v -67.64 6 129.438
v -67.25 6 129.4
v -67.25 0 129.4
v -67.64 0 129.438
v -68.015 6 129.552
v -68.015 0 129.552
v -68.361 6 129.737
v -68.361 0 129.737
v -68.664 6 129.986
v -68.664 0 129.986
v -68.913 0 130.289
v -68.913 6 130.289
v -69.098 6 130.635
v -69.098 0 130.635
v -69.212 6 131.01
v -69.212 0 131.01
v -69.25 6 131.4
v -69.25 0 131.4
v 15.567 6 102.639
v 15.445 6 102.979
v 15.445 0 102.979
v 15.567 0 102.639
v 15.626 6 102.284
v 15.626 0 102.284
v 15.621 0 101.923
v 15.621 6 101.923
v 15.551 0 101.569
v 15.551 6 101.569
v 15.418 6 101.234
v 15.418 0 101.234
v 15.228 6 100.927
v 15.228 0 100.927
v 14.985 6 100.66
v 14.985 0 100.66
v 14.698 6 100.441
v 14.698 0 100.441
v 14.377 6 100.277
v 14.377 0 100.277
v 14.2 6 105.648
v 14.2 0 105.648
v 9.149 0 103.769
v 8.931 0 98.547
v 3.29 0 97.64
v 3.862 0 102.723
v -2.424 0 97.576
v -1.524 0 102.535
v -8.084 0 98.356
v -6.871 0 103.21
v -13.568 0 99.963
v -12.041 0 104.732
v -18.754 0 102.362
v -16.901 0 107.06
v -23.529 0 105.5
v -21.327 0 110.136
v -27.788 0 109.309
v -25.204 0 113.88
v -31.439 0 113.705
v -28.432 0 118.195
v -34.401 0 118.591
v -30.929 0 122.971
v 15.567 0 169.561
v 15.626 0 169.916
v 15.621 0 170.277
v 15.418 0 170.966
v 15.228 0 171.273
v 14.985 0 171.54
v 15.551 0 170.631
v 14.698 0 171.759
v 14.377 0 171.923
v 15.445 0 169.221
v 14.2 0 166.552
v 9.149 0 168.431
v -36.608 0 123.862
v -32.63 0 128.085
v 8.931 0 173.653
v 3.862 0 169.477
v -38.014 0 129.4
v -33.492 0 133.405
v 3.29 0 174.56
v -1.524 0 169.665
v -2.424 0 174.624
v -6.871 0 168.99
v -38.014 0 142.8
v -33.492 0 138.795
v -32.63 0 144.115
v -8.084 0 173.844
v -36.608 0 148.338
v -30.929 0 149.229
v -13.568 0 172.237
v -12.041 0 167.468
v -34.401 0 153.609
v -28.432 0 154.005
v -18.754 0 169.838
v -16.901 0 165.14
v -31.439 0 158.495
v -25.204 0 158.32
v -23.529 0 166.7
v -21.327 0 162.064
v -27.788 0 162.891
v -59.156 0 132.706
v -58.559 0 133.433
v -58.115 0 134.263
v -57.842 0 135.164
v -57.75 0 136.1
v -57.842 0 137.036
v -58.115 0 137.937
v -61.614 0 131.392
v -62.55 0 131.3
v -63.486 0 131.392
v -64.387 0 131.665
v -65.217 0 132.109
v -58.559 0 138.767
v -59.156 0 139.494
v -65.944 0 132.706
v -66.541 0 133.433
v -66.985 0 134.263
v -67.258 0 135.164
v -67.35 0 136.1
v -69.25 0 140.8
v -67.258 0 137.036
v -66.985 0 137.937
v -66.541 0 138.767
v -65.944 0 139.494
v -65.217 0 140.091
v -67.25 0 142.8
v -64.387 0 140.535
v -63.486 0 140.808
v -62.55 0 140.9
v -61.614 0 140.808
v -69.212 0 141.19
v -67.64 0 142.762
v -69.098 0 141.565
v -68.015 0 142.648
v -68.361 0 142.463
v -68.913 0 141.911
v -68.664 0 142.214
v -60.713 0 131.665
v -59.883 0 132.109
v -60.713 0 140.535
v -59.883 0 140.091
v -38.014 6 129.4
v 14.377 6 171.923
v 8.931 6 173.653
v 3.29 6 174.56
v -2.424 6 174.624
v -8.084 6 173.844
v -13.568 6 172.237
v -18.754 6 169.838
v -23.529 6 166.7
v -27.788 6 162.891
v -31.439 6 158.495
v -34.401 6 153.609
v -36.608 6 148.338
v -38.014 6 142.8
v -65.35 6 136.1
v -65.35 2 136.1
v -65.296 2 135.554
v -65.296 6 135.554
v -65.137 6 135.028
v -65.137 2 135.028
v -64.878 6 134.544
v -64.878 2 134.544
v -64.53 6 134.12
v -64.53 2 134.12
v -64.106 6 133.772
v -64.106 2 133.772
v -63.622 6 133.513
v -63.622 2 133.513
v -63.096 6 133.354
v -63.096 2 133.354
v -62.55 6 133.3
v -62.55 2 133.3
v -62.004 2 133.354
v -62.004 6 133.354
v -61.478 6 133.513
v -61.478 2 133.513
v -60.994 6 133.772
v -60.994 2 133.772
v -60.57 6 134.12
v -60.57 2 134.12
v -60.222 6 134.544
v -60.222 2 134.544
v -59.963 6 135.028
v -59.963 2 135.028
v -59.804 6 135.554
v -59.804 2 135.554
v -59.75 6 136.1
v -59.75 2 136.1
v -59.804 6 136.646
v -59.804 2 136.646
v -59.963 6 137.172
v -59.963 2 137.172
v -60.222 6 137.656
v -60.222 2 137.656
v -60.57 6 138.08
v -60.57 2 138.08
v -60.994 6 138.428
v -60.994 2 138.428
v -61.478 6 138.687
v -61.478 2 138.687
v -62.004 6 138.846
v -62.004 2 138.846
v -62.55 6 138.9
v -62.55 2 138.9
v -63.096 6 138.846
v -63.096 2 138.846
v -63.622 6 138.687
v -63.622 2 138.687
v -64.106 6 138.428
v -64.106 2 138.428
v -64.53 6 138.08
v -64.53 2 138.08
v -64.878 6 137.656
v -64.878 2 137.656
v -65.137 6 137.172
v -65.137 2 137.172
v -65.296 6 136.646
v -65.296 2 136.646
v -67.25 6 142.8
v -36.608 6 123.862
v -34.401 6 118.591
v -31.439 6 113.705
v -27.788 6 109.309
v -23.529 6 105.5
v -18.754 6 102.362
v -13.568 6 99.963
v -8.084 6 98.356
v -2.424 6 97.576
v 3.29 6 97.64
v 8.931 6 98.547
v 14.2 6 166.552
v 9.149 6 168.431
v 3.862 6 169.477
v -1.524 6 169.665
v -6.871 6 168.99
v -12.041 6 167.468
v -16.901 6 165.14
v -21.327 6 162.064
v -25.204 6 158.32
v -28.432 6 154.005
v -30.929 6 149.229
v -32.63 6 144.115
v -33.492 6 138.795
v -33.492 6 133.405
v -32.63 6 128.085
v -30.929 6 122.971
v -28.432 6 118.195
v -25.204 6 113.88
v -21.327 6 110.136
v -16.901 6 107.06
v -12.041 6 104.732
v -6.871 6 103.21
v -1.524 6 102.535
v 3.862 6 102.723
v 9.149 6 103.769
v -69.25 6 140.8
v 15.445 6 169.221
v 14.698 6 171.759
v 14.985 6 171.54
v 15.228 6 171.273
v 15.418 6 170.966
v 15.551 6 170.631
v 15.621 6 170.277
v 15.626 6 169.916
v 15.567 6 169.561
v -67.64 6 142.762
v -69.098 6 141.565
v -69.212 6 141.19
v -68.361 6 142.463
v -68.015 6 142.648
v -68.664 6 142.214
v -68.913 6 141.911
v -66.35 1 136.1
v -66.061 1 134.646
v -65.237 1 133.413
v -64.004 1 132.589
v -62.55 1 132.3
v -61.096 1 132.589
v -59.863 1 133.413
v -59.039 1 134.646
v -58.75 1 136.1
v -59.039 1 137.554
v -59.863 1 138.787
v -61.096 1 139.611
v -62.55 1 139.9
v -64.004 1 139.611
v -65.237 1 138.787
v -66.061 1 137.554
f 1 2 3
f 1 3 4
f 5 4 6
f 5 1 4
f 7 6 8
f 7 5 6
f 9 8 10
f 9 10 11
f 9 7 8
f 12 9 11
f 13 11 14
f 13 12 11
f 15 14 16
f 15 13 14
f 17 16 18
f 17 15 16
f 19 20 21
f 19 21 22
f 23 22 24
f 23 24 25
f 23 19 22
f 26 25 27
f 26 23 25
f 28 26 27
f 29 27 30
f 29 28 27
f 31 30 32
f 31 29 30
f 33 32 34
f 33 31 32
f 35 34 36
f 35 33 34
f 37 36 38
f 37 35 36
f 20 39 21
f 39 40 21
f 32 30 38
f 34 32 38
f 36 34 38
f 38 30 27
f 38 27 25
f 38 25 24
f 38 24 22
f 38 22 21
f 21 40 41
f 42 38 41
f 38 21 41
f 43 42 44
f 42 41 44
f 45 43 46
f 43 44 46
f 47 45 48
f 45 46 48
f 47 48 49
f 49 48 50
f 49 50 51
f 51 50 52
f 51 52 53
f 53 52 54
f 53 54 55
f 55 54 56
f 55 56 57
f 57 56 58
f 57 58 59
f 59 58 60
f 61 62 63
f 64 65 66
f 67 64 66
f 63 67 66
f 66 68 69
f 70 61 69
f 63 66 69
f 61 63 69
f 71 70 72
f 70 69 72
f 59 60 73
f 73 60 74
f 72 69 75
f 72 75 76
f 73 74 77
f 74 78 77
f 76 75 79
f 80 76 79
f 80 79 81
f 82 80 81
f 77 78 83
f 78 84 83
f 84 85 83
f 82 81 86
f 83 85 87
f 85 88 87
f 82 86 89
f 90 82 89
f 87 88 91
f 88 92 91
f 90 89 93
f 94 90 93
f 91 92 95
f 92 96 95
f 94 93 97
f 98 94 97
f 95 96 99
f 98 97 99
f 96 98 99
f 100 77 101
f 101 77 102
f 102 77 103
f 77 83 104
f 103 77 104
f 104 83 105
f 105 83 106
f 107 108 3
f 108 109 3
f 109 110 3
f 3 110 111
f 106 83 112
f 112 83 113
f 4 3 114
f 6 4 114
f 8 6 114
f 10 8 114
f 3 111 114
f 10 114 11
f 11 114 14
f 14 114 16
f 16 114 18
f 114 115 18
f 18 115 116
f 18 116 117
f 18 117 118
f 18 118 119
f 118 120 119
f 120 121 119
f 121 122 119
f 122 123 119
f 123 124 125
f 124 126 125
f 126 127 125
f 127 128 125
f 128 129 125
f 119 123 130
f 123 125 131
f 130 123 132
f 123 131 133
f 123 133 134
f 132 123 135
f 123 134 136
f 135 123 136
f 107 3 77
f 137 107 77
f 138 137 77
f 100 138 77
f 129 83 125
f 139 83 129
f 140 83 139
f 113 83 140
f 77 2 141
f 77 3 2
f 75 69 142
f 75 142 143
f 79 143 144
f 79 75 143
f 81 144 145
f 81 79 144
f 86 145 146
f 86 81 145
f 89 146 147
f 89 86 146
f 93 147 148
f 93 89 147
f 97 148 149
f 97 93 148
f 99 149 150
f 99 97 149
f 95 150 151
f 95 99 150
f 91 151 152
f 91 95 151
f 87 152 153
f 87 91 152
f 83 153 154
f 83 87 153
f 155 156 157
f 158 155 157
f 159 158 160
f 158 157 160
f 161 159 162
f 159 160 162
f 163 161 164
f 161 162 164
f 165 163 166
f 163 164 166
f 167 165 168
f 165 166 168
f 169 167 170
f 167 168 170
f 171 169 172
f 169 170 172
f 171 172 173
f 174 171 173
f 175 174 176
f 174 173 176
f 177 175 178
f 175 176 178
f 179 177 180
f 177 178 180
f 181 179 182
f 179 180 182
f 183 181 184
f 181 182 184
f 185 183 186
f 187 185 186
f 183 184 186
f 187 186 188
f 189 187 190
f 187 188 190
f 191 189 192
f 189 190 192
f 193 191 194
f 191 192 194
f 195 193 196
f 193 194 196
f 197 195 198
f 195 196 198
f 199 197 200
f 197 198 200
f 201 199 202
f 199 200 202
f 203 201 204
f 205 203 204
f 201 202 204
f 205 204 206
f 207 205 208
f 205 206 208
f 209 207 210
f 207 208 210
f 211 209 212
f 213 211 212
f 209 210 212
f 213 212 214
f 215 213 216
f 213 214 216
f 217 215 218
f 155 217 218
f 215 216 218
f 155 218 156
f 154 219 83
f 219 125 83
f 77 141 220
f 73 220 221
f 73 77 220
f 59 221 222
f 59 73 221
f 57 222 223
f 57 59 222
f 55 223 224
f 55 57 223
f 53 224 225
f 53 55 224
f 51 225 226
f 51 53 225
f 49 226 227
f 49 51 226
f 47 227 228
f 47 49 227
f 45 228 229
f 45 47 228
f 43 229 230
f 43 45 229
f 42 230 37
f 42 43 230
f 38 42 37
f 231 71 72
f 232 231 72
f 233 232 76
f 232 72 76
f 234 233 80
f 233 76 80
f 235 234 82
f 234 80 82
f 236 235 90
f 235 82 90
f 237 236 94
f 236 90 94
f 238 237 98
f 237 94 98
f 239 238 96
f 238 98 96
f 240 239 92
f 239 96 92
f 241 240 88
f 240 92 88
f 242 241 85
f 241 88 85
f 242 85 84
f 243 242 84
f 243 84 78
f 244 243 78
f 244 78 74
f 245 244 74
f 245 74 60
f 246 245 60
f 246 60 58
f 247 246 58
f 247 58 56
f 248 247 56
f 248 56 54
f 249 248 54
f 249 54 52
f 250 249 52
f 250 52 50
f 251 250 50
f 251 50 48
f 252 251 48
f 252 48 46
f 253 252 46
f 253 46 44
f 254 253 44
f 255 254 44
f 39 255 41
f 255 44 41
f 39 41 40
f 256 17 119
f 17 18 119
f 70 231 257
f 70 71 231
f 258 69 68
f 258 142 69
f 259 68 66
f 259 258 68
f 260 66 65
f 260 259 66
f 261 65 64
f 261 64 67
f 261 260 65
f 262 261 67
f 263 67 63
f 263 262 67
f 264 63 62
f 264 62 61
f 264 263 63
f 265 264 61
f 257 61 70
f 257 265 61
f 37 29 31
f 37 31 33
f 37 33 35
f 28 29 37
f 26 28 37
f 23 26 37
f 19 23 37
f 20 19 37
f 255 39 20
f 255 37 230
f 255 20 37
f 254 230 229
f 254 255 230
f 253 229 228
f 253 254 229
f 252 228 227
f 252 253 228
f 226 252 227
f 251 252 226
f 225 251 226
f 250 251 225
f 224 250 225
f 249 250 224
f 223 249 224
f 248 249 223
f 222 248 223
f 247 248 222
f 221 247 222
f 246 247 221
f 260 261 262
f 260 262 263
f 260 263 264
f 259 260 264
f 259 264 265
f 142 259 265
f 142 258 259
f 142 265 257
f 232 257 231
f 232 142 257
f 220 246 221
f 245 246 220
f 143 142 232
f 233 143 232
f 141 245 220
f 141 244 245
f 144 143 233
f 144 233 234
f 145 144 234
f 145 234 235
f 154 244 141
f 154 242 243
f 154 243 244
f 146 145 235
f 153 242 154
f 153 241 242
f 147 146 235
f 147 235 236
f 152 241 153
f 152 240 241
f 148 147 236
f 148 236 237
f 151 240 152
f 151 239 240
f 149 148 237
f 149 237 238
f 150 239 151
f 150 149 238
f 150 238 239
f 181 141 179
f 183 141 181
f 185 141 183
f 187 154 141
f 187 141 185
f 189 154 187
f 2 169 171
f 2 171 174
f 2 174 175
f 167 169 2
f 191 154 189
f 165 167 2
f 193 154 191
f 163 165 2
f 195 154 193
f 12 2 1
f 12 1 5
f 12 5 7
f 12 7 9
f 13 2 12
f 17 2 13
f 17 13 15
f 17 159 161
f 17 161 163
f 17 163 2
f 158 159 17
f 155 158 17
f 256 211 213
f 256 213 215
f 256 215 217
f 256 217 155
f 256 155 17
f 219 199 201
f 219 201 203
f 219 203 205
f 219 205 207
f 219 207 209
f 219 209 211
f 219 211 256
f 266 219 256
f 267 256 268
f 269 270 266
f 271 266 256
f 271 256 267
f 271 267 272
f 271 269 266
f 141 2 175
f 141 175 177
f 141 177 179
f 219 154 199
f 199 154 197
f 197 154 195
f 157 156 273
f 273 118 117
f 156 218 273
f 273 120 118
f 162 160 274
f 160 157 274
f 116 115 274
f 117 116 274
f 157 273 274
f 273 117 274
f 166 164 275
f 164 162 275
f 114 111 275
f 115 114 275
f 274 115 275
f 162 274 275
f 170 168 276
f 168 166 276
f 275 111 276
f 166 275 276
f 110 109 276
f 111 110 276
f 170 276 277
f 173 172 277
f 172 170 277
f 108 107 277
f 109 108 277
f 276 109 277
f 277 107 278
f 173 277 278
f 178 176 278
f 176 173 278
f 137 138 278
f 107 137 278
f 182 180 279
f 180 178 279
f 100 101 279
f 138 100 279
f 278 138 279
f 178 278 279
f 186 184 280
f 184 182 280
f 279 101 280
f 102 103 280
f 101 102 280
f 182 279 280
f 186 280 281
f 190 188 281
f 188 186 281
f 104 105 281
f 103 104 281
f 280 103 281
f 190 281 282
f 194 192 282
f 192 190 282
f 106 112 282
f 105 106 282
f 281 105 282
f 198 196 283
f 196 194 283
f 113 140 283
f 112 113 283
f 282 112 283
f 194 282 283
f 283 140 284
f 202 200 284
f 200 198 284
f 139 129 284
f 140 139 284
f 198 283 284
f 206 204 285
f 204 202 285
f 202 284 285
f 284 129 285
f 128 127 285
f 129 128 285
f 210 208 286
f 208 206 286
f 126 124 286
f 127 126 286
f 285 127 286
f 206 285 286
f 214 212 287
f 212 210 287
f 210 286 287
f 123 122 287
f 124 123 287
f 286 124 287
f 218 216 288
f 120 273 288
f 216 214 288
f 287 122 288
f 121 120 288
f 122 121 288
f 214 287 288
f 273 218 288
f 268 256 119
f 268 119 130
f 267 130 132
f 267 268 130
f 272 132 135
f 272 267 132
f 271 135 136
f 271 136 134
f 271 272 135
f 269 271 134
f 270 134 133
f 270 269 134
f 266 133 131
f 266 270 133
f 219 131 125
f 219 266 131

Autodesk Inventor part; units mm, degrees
ref_plane "YZ Plane" through (0, 0, 0) normal (1, 0, 0) x (0, 1, 0)
ref_plane "XZ Plane" through (0, 0, 0) normal (0, 1, 0) x (-1, 0, 0)
ref_plane "XY Plane" through (0, 0, 0) normal (0, 0, 1) x (1, 0, 0)
sketch "Sketch1" plane through (0, 0, 0) normal (0, 1, 0) x (-1, 0, 0)
  circle A0 centre (0, 0) radius 32.5
  line L0 (0, 32.5) -> (0, 102.5)
  line L1 (0, 102.5) -> (0, 169.7)
  circle A1 centre (0, 136.1) radius 33.6
  circle A2 centre (0, 136.1) radius 42.65
  line L2 (42.65, 136.1) -> (40.15, 136.1)
  line L3 (40.15, 136.1) -> (62.55, 136.1)
  circle A3 centre (62.55, 136.1) radius 22.4
  line L4 (62.55, 136.1) -> (62.55, 134.2)
  line L5 (62.55, 136.1) -> (62.55, 138)
  circle A4 centre (62.55, 136.1) radius 2.8
  line L6 (62.55, 138) -> (64.6067, 138)
  line L7 (62.55, 138) -> (60.4933, 138)
  line L8 (62.55, 134.2) -> (60.4933, 134.2)
  line L9 (62.55, 134.2) -> (64.6067, 134.2)
  circle A5 centre (62.55, 136.1) radius 4.7
  line L10 (0, -32.5) -> (0, -37.5)
  circle A6 centre (0, 0) radius 37.5
  line L11 (0, 32.5) -> (5, 32.5)
  line L12 (5, 32.5) -> (5, 93.7441)
  line L13 (0, 32.5) -> (-5, 32.5)
  line L14 (-5, 32.5) -> (-5, 93.7441)
  line L15 (0, 0) -> (29.257, 0) construction
  line L16 (0, 0) -> (37.5, 0) construction
  line L17 (0, 0) -> (32.476, 18.75)
  line L18 (0, 0) -> (37.5, 0) construction
  line L19 (0, 0) -> (-32.476, 18.75)
  line L20 (0, 0) -> (37.5, 0) construction
  line L21 (0, 169.7) -> (0, 174.7)
  circle A7 centre (0, 136.1) radius 38.6
  line L22 (67.25, 136.1) -> (69.25, 136.1)
  line L23 (62.55, 140.8) -> (62.55, 142.8)
  line L24 (62.55, 131.4) -> (62.55, 129.4)
  line L25 (5, 93.7441) -> (5, 102.8741)
  line L26 (-5, 93.7441) -> (-5, 102.8741)
  line L27 (62.55, 129.4) -> (32.9252, 129.4)
  line L28 (62.55, 142.8) -> (32.9252, 142.8)
  line L29 (62.55, 142.8) -> (69.25, 142.8)
  line L30 (69.25, 142.8) -> (69.25, 136.1)
  line L31 (69.25, 129.4) -> (69.25, 136.1)
  line L32 (69.25, 129.4) -> (62.55, 129.4)
  line L33 (0, 136.1) -> (-18.0247, 97.446)
  line L34 (0, 136.1) -> (42.65, 136.1) construction
  line L35 (0, 136.1) -> (-18.0247, 174.754)
  line L36 (0, 136.1) -> (42.65, 136.1) construction
  point P0 (37.3613, 126.4)
  point P1 (41.8047, 144.5494)
  point P2 (41.8047, 127.6506)
  point P3 (42.1205, 129.4)
  point P4 (42.1205, 142.8)
  point P5 (5, 97.8252)
  point P6 (38.0141, 129.4)
  point P7 (41.1755, 129.4)
  point P8 (41.1755, 142.8)
  point P9 (38.0141, 142.8)
  point P10 (-5, 97.8252)
  point P11 (-16.3131, 171.0835)
  point P12 (-14.2, 166.5519)
  point P13 (-14.2, 105.6481)
  point P14 (-16.3131, 101.1165)
  dimension "d0" = 65
  dimension "d1" = 70
  dimension "d2" = 67.2
  dimension "d3" = 85.3
  dimension "d4" = 2.5
  dimension "d6" = 22.4
  dimension "d7" = 1.9
  dimension "d8" = 1.9
  dimension "d9" = 5.6
  dimension "d10" = 9.4
  dimension "d11" = 5
  dimension "d12" = 5
  dimension "d13" = 5
  dimension "d16" = 30
  dimension "d17" = 150
  dimension "d18" = 5
  dimension "d19" = 2
  dimension "d20" = 2
  dimension "d21" = 2
  dimension "d28" = 115
  dimension "d29" = 115
extrude "Extrusion1" add sketch "Sketch1" along normal blind 6 contours A7 L26 A1 L0 | L0 A1 L25 A7 | A7 L33 A1 L26 | L25 A1 L27 A7 | L27 A3 L2 A2 | A2 L3 A5 L24 L27 | L27 A7 L28 A3 | L27 A1 L28 A7 | A7 L21 A1 L35 | L2 A3 L28 A2 | A2 L28 L23 A5 L3 | L24 A5 L22 L31 L32 | L21 A7 L28 A1 | A5 | L29 L30 L22 A5 L23
chamfer "Chamfer1" distance 2 angle 45 1 edges at (-59.75, 0, 136.1)
fillet "Fillet1" radius 2 4 edges at (-69.25, 3, 129.4) (-69.25, 3, 142.8) (16.3131, 3, 101.1165) (16.3131, 3, 171.0835)
properties part number "door mount backplate"
